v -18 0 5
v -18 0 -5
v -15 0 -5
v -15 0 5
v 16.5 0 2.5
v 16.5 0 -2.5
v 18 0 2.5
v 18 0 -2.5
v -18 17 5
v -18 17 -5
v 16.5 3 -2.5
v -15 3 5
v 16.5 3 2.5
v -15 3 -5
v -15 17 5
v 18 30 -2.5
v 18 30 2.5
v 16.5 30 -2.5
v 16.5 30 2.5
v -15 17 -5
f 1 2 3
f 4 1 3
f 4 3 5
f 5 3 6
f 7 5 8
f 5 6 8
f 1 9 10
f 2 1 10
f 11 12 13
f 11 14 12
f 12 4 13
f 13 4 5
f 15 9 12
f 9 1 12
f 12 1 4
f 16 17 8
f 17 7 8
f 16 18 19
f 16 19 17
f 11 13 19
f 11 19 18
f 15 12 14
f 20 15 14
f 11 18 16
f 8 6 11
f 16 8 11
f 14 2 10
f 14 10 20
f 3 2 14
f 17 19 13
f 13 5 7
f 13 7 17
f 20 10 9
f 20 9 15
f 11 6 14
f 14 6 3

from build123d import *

# Parameters (mm, degrees)
BOSS_EXTRUDE1_DEPTH = 3
SKETCH2_W           = 3
SKETCH2_H           = 10
BOSS_EXTRUDE2_DEPTH = 14
SKETCH3_W           = 1.5
SKETCH3_H           = 5
BOSS_EXTRUDE3_DEPTH = 27


with BuildPart() as part:
    # Sketch1 → Boss-Extrude1 (new body)
    with BuildSketch(Plane(origin=(0, 0, 0), x_dir=(1, 0, 0), z_dir=(0, 1, 0))):
        Polygon((18, 2.5), (16.5, 2.5), (-15, 5), (-18, 5), (-18, -5), (-15, -5), (16.5, -2.5), (18, -2.5), align=None)
    extrude(amount=BOSS_EXTRUDE1_DEPTH)

    # Sketch2 → Boss-Extrude2 (add)
    with BuildSketch(Plane(origin=(0, 3, 0), x_dir=(1, 0, 0), z_dir=(0, 1, 0))):
        with Locations((-16.5, 0)):
            Rectangle(SKETCH2_W, SKETCH2_H)
    extrude(amount=BOSS_EXTRUDE2_DEPTH)

    # Sketch3 → Boss-Extrude3 (add)
    with BuildSketch(Plane(origin=(0, 3, 0), x_dir=(1, 0, 0), z_dir=(0, 1, 0))):
        with Locations((17.25, 0)):
            Rectangle(SKETCH3_W, SKETCH3_H)
    extrude(amount=BOSS_EXTRUDE3_DEPTH)


solid = part.part
